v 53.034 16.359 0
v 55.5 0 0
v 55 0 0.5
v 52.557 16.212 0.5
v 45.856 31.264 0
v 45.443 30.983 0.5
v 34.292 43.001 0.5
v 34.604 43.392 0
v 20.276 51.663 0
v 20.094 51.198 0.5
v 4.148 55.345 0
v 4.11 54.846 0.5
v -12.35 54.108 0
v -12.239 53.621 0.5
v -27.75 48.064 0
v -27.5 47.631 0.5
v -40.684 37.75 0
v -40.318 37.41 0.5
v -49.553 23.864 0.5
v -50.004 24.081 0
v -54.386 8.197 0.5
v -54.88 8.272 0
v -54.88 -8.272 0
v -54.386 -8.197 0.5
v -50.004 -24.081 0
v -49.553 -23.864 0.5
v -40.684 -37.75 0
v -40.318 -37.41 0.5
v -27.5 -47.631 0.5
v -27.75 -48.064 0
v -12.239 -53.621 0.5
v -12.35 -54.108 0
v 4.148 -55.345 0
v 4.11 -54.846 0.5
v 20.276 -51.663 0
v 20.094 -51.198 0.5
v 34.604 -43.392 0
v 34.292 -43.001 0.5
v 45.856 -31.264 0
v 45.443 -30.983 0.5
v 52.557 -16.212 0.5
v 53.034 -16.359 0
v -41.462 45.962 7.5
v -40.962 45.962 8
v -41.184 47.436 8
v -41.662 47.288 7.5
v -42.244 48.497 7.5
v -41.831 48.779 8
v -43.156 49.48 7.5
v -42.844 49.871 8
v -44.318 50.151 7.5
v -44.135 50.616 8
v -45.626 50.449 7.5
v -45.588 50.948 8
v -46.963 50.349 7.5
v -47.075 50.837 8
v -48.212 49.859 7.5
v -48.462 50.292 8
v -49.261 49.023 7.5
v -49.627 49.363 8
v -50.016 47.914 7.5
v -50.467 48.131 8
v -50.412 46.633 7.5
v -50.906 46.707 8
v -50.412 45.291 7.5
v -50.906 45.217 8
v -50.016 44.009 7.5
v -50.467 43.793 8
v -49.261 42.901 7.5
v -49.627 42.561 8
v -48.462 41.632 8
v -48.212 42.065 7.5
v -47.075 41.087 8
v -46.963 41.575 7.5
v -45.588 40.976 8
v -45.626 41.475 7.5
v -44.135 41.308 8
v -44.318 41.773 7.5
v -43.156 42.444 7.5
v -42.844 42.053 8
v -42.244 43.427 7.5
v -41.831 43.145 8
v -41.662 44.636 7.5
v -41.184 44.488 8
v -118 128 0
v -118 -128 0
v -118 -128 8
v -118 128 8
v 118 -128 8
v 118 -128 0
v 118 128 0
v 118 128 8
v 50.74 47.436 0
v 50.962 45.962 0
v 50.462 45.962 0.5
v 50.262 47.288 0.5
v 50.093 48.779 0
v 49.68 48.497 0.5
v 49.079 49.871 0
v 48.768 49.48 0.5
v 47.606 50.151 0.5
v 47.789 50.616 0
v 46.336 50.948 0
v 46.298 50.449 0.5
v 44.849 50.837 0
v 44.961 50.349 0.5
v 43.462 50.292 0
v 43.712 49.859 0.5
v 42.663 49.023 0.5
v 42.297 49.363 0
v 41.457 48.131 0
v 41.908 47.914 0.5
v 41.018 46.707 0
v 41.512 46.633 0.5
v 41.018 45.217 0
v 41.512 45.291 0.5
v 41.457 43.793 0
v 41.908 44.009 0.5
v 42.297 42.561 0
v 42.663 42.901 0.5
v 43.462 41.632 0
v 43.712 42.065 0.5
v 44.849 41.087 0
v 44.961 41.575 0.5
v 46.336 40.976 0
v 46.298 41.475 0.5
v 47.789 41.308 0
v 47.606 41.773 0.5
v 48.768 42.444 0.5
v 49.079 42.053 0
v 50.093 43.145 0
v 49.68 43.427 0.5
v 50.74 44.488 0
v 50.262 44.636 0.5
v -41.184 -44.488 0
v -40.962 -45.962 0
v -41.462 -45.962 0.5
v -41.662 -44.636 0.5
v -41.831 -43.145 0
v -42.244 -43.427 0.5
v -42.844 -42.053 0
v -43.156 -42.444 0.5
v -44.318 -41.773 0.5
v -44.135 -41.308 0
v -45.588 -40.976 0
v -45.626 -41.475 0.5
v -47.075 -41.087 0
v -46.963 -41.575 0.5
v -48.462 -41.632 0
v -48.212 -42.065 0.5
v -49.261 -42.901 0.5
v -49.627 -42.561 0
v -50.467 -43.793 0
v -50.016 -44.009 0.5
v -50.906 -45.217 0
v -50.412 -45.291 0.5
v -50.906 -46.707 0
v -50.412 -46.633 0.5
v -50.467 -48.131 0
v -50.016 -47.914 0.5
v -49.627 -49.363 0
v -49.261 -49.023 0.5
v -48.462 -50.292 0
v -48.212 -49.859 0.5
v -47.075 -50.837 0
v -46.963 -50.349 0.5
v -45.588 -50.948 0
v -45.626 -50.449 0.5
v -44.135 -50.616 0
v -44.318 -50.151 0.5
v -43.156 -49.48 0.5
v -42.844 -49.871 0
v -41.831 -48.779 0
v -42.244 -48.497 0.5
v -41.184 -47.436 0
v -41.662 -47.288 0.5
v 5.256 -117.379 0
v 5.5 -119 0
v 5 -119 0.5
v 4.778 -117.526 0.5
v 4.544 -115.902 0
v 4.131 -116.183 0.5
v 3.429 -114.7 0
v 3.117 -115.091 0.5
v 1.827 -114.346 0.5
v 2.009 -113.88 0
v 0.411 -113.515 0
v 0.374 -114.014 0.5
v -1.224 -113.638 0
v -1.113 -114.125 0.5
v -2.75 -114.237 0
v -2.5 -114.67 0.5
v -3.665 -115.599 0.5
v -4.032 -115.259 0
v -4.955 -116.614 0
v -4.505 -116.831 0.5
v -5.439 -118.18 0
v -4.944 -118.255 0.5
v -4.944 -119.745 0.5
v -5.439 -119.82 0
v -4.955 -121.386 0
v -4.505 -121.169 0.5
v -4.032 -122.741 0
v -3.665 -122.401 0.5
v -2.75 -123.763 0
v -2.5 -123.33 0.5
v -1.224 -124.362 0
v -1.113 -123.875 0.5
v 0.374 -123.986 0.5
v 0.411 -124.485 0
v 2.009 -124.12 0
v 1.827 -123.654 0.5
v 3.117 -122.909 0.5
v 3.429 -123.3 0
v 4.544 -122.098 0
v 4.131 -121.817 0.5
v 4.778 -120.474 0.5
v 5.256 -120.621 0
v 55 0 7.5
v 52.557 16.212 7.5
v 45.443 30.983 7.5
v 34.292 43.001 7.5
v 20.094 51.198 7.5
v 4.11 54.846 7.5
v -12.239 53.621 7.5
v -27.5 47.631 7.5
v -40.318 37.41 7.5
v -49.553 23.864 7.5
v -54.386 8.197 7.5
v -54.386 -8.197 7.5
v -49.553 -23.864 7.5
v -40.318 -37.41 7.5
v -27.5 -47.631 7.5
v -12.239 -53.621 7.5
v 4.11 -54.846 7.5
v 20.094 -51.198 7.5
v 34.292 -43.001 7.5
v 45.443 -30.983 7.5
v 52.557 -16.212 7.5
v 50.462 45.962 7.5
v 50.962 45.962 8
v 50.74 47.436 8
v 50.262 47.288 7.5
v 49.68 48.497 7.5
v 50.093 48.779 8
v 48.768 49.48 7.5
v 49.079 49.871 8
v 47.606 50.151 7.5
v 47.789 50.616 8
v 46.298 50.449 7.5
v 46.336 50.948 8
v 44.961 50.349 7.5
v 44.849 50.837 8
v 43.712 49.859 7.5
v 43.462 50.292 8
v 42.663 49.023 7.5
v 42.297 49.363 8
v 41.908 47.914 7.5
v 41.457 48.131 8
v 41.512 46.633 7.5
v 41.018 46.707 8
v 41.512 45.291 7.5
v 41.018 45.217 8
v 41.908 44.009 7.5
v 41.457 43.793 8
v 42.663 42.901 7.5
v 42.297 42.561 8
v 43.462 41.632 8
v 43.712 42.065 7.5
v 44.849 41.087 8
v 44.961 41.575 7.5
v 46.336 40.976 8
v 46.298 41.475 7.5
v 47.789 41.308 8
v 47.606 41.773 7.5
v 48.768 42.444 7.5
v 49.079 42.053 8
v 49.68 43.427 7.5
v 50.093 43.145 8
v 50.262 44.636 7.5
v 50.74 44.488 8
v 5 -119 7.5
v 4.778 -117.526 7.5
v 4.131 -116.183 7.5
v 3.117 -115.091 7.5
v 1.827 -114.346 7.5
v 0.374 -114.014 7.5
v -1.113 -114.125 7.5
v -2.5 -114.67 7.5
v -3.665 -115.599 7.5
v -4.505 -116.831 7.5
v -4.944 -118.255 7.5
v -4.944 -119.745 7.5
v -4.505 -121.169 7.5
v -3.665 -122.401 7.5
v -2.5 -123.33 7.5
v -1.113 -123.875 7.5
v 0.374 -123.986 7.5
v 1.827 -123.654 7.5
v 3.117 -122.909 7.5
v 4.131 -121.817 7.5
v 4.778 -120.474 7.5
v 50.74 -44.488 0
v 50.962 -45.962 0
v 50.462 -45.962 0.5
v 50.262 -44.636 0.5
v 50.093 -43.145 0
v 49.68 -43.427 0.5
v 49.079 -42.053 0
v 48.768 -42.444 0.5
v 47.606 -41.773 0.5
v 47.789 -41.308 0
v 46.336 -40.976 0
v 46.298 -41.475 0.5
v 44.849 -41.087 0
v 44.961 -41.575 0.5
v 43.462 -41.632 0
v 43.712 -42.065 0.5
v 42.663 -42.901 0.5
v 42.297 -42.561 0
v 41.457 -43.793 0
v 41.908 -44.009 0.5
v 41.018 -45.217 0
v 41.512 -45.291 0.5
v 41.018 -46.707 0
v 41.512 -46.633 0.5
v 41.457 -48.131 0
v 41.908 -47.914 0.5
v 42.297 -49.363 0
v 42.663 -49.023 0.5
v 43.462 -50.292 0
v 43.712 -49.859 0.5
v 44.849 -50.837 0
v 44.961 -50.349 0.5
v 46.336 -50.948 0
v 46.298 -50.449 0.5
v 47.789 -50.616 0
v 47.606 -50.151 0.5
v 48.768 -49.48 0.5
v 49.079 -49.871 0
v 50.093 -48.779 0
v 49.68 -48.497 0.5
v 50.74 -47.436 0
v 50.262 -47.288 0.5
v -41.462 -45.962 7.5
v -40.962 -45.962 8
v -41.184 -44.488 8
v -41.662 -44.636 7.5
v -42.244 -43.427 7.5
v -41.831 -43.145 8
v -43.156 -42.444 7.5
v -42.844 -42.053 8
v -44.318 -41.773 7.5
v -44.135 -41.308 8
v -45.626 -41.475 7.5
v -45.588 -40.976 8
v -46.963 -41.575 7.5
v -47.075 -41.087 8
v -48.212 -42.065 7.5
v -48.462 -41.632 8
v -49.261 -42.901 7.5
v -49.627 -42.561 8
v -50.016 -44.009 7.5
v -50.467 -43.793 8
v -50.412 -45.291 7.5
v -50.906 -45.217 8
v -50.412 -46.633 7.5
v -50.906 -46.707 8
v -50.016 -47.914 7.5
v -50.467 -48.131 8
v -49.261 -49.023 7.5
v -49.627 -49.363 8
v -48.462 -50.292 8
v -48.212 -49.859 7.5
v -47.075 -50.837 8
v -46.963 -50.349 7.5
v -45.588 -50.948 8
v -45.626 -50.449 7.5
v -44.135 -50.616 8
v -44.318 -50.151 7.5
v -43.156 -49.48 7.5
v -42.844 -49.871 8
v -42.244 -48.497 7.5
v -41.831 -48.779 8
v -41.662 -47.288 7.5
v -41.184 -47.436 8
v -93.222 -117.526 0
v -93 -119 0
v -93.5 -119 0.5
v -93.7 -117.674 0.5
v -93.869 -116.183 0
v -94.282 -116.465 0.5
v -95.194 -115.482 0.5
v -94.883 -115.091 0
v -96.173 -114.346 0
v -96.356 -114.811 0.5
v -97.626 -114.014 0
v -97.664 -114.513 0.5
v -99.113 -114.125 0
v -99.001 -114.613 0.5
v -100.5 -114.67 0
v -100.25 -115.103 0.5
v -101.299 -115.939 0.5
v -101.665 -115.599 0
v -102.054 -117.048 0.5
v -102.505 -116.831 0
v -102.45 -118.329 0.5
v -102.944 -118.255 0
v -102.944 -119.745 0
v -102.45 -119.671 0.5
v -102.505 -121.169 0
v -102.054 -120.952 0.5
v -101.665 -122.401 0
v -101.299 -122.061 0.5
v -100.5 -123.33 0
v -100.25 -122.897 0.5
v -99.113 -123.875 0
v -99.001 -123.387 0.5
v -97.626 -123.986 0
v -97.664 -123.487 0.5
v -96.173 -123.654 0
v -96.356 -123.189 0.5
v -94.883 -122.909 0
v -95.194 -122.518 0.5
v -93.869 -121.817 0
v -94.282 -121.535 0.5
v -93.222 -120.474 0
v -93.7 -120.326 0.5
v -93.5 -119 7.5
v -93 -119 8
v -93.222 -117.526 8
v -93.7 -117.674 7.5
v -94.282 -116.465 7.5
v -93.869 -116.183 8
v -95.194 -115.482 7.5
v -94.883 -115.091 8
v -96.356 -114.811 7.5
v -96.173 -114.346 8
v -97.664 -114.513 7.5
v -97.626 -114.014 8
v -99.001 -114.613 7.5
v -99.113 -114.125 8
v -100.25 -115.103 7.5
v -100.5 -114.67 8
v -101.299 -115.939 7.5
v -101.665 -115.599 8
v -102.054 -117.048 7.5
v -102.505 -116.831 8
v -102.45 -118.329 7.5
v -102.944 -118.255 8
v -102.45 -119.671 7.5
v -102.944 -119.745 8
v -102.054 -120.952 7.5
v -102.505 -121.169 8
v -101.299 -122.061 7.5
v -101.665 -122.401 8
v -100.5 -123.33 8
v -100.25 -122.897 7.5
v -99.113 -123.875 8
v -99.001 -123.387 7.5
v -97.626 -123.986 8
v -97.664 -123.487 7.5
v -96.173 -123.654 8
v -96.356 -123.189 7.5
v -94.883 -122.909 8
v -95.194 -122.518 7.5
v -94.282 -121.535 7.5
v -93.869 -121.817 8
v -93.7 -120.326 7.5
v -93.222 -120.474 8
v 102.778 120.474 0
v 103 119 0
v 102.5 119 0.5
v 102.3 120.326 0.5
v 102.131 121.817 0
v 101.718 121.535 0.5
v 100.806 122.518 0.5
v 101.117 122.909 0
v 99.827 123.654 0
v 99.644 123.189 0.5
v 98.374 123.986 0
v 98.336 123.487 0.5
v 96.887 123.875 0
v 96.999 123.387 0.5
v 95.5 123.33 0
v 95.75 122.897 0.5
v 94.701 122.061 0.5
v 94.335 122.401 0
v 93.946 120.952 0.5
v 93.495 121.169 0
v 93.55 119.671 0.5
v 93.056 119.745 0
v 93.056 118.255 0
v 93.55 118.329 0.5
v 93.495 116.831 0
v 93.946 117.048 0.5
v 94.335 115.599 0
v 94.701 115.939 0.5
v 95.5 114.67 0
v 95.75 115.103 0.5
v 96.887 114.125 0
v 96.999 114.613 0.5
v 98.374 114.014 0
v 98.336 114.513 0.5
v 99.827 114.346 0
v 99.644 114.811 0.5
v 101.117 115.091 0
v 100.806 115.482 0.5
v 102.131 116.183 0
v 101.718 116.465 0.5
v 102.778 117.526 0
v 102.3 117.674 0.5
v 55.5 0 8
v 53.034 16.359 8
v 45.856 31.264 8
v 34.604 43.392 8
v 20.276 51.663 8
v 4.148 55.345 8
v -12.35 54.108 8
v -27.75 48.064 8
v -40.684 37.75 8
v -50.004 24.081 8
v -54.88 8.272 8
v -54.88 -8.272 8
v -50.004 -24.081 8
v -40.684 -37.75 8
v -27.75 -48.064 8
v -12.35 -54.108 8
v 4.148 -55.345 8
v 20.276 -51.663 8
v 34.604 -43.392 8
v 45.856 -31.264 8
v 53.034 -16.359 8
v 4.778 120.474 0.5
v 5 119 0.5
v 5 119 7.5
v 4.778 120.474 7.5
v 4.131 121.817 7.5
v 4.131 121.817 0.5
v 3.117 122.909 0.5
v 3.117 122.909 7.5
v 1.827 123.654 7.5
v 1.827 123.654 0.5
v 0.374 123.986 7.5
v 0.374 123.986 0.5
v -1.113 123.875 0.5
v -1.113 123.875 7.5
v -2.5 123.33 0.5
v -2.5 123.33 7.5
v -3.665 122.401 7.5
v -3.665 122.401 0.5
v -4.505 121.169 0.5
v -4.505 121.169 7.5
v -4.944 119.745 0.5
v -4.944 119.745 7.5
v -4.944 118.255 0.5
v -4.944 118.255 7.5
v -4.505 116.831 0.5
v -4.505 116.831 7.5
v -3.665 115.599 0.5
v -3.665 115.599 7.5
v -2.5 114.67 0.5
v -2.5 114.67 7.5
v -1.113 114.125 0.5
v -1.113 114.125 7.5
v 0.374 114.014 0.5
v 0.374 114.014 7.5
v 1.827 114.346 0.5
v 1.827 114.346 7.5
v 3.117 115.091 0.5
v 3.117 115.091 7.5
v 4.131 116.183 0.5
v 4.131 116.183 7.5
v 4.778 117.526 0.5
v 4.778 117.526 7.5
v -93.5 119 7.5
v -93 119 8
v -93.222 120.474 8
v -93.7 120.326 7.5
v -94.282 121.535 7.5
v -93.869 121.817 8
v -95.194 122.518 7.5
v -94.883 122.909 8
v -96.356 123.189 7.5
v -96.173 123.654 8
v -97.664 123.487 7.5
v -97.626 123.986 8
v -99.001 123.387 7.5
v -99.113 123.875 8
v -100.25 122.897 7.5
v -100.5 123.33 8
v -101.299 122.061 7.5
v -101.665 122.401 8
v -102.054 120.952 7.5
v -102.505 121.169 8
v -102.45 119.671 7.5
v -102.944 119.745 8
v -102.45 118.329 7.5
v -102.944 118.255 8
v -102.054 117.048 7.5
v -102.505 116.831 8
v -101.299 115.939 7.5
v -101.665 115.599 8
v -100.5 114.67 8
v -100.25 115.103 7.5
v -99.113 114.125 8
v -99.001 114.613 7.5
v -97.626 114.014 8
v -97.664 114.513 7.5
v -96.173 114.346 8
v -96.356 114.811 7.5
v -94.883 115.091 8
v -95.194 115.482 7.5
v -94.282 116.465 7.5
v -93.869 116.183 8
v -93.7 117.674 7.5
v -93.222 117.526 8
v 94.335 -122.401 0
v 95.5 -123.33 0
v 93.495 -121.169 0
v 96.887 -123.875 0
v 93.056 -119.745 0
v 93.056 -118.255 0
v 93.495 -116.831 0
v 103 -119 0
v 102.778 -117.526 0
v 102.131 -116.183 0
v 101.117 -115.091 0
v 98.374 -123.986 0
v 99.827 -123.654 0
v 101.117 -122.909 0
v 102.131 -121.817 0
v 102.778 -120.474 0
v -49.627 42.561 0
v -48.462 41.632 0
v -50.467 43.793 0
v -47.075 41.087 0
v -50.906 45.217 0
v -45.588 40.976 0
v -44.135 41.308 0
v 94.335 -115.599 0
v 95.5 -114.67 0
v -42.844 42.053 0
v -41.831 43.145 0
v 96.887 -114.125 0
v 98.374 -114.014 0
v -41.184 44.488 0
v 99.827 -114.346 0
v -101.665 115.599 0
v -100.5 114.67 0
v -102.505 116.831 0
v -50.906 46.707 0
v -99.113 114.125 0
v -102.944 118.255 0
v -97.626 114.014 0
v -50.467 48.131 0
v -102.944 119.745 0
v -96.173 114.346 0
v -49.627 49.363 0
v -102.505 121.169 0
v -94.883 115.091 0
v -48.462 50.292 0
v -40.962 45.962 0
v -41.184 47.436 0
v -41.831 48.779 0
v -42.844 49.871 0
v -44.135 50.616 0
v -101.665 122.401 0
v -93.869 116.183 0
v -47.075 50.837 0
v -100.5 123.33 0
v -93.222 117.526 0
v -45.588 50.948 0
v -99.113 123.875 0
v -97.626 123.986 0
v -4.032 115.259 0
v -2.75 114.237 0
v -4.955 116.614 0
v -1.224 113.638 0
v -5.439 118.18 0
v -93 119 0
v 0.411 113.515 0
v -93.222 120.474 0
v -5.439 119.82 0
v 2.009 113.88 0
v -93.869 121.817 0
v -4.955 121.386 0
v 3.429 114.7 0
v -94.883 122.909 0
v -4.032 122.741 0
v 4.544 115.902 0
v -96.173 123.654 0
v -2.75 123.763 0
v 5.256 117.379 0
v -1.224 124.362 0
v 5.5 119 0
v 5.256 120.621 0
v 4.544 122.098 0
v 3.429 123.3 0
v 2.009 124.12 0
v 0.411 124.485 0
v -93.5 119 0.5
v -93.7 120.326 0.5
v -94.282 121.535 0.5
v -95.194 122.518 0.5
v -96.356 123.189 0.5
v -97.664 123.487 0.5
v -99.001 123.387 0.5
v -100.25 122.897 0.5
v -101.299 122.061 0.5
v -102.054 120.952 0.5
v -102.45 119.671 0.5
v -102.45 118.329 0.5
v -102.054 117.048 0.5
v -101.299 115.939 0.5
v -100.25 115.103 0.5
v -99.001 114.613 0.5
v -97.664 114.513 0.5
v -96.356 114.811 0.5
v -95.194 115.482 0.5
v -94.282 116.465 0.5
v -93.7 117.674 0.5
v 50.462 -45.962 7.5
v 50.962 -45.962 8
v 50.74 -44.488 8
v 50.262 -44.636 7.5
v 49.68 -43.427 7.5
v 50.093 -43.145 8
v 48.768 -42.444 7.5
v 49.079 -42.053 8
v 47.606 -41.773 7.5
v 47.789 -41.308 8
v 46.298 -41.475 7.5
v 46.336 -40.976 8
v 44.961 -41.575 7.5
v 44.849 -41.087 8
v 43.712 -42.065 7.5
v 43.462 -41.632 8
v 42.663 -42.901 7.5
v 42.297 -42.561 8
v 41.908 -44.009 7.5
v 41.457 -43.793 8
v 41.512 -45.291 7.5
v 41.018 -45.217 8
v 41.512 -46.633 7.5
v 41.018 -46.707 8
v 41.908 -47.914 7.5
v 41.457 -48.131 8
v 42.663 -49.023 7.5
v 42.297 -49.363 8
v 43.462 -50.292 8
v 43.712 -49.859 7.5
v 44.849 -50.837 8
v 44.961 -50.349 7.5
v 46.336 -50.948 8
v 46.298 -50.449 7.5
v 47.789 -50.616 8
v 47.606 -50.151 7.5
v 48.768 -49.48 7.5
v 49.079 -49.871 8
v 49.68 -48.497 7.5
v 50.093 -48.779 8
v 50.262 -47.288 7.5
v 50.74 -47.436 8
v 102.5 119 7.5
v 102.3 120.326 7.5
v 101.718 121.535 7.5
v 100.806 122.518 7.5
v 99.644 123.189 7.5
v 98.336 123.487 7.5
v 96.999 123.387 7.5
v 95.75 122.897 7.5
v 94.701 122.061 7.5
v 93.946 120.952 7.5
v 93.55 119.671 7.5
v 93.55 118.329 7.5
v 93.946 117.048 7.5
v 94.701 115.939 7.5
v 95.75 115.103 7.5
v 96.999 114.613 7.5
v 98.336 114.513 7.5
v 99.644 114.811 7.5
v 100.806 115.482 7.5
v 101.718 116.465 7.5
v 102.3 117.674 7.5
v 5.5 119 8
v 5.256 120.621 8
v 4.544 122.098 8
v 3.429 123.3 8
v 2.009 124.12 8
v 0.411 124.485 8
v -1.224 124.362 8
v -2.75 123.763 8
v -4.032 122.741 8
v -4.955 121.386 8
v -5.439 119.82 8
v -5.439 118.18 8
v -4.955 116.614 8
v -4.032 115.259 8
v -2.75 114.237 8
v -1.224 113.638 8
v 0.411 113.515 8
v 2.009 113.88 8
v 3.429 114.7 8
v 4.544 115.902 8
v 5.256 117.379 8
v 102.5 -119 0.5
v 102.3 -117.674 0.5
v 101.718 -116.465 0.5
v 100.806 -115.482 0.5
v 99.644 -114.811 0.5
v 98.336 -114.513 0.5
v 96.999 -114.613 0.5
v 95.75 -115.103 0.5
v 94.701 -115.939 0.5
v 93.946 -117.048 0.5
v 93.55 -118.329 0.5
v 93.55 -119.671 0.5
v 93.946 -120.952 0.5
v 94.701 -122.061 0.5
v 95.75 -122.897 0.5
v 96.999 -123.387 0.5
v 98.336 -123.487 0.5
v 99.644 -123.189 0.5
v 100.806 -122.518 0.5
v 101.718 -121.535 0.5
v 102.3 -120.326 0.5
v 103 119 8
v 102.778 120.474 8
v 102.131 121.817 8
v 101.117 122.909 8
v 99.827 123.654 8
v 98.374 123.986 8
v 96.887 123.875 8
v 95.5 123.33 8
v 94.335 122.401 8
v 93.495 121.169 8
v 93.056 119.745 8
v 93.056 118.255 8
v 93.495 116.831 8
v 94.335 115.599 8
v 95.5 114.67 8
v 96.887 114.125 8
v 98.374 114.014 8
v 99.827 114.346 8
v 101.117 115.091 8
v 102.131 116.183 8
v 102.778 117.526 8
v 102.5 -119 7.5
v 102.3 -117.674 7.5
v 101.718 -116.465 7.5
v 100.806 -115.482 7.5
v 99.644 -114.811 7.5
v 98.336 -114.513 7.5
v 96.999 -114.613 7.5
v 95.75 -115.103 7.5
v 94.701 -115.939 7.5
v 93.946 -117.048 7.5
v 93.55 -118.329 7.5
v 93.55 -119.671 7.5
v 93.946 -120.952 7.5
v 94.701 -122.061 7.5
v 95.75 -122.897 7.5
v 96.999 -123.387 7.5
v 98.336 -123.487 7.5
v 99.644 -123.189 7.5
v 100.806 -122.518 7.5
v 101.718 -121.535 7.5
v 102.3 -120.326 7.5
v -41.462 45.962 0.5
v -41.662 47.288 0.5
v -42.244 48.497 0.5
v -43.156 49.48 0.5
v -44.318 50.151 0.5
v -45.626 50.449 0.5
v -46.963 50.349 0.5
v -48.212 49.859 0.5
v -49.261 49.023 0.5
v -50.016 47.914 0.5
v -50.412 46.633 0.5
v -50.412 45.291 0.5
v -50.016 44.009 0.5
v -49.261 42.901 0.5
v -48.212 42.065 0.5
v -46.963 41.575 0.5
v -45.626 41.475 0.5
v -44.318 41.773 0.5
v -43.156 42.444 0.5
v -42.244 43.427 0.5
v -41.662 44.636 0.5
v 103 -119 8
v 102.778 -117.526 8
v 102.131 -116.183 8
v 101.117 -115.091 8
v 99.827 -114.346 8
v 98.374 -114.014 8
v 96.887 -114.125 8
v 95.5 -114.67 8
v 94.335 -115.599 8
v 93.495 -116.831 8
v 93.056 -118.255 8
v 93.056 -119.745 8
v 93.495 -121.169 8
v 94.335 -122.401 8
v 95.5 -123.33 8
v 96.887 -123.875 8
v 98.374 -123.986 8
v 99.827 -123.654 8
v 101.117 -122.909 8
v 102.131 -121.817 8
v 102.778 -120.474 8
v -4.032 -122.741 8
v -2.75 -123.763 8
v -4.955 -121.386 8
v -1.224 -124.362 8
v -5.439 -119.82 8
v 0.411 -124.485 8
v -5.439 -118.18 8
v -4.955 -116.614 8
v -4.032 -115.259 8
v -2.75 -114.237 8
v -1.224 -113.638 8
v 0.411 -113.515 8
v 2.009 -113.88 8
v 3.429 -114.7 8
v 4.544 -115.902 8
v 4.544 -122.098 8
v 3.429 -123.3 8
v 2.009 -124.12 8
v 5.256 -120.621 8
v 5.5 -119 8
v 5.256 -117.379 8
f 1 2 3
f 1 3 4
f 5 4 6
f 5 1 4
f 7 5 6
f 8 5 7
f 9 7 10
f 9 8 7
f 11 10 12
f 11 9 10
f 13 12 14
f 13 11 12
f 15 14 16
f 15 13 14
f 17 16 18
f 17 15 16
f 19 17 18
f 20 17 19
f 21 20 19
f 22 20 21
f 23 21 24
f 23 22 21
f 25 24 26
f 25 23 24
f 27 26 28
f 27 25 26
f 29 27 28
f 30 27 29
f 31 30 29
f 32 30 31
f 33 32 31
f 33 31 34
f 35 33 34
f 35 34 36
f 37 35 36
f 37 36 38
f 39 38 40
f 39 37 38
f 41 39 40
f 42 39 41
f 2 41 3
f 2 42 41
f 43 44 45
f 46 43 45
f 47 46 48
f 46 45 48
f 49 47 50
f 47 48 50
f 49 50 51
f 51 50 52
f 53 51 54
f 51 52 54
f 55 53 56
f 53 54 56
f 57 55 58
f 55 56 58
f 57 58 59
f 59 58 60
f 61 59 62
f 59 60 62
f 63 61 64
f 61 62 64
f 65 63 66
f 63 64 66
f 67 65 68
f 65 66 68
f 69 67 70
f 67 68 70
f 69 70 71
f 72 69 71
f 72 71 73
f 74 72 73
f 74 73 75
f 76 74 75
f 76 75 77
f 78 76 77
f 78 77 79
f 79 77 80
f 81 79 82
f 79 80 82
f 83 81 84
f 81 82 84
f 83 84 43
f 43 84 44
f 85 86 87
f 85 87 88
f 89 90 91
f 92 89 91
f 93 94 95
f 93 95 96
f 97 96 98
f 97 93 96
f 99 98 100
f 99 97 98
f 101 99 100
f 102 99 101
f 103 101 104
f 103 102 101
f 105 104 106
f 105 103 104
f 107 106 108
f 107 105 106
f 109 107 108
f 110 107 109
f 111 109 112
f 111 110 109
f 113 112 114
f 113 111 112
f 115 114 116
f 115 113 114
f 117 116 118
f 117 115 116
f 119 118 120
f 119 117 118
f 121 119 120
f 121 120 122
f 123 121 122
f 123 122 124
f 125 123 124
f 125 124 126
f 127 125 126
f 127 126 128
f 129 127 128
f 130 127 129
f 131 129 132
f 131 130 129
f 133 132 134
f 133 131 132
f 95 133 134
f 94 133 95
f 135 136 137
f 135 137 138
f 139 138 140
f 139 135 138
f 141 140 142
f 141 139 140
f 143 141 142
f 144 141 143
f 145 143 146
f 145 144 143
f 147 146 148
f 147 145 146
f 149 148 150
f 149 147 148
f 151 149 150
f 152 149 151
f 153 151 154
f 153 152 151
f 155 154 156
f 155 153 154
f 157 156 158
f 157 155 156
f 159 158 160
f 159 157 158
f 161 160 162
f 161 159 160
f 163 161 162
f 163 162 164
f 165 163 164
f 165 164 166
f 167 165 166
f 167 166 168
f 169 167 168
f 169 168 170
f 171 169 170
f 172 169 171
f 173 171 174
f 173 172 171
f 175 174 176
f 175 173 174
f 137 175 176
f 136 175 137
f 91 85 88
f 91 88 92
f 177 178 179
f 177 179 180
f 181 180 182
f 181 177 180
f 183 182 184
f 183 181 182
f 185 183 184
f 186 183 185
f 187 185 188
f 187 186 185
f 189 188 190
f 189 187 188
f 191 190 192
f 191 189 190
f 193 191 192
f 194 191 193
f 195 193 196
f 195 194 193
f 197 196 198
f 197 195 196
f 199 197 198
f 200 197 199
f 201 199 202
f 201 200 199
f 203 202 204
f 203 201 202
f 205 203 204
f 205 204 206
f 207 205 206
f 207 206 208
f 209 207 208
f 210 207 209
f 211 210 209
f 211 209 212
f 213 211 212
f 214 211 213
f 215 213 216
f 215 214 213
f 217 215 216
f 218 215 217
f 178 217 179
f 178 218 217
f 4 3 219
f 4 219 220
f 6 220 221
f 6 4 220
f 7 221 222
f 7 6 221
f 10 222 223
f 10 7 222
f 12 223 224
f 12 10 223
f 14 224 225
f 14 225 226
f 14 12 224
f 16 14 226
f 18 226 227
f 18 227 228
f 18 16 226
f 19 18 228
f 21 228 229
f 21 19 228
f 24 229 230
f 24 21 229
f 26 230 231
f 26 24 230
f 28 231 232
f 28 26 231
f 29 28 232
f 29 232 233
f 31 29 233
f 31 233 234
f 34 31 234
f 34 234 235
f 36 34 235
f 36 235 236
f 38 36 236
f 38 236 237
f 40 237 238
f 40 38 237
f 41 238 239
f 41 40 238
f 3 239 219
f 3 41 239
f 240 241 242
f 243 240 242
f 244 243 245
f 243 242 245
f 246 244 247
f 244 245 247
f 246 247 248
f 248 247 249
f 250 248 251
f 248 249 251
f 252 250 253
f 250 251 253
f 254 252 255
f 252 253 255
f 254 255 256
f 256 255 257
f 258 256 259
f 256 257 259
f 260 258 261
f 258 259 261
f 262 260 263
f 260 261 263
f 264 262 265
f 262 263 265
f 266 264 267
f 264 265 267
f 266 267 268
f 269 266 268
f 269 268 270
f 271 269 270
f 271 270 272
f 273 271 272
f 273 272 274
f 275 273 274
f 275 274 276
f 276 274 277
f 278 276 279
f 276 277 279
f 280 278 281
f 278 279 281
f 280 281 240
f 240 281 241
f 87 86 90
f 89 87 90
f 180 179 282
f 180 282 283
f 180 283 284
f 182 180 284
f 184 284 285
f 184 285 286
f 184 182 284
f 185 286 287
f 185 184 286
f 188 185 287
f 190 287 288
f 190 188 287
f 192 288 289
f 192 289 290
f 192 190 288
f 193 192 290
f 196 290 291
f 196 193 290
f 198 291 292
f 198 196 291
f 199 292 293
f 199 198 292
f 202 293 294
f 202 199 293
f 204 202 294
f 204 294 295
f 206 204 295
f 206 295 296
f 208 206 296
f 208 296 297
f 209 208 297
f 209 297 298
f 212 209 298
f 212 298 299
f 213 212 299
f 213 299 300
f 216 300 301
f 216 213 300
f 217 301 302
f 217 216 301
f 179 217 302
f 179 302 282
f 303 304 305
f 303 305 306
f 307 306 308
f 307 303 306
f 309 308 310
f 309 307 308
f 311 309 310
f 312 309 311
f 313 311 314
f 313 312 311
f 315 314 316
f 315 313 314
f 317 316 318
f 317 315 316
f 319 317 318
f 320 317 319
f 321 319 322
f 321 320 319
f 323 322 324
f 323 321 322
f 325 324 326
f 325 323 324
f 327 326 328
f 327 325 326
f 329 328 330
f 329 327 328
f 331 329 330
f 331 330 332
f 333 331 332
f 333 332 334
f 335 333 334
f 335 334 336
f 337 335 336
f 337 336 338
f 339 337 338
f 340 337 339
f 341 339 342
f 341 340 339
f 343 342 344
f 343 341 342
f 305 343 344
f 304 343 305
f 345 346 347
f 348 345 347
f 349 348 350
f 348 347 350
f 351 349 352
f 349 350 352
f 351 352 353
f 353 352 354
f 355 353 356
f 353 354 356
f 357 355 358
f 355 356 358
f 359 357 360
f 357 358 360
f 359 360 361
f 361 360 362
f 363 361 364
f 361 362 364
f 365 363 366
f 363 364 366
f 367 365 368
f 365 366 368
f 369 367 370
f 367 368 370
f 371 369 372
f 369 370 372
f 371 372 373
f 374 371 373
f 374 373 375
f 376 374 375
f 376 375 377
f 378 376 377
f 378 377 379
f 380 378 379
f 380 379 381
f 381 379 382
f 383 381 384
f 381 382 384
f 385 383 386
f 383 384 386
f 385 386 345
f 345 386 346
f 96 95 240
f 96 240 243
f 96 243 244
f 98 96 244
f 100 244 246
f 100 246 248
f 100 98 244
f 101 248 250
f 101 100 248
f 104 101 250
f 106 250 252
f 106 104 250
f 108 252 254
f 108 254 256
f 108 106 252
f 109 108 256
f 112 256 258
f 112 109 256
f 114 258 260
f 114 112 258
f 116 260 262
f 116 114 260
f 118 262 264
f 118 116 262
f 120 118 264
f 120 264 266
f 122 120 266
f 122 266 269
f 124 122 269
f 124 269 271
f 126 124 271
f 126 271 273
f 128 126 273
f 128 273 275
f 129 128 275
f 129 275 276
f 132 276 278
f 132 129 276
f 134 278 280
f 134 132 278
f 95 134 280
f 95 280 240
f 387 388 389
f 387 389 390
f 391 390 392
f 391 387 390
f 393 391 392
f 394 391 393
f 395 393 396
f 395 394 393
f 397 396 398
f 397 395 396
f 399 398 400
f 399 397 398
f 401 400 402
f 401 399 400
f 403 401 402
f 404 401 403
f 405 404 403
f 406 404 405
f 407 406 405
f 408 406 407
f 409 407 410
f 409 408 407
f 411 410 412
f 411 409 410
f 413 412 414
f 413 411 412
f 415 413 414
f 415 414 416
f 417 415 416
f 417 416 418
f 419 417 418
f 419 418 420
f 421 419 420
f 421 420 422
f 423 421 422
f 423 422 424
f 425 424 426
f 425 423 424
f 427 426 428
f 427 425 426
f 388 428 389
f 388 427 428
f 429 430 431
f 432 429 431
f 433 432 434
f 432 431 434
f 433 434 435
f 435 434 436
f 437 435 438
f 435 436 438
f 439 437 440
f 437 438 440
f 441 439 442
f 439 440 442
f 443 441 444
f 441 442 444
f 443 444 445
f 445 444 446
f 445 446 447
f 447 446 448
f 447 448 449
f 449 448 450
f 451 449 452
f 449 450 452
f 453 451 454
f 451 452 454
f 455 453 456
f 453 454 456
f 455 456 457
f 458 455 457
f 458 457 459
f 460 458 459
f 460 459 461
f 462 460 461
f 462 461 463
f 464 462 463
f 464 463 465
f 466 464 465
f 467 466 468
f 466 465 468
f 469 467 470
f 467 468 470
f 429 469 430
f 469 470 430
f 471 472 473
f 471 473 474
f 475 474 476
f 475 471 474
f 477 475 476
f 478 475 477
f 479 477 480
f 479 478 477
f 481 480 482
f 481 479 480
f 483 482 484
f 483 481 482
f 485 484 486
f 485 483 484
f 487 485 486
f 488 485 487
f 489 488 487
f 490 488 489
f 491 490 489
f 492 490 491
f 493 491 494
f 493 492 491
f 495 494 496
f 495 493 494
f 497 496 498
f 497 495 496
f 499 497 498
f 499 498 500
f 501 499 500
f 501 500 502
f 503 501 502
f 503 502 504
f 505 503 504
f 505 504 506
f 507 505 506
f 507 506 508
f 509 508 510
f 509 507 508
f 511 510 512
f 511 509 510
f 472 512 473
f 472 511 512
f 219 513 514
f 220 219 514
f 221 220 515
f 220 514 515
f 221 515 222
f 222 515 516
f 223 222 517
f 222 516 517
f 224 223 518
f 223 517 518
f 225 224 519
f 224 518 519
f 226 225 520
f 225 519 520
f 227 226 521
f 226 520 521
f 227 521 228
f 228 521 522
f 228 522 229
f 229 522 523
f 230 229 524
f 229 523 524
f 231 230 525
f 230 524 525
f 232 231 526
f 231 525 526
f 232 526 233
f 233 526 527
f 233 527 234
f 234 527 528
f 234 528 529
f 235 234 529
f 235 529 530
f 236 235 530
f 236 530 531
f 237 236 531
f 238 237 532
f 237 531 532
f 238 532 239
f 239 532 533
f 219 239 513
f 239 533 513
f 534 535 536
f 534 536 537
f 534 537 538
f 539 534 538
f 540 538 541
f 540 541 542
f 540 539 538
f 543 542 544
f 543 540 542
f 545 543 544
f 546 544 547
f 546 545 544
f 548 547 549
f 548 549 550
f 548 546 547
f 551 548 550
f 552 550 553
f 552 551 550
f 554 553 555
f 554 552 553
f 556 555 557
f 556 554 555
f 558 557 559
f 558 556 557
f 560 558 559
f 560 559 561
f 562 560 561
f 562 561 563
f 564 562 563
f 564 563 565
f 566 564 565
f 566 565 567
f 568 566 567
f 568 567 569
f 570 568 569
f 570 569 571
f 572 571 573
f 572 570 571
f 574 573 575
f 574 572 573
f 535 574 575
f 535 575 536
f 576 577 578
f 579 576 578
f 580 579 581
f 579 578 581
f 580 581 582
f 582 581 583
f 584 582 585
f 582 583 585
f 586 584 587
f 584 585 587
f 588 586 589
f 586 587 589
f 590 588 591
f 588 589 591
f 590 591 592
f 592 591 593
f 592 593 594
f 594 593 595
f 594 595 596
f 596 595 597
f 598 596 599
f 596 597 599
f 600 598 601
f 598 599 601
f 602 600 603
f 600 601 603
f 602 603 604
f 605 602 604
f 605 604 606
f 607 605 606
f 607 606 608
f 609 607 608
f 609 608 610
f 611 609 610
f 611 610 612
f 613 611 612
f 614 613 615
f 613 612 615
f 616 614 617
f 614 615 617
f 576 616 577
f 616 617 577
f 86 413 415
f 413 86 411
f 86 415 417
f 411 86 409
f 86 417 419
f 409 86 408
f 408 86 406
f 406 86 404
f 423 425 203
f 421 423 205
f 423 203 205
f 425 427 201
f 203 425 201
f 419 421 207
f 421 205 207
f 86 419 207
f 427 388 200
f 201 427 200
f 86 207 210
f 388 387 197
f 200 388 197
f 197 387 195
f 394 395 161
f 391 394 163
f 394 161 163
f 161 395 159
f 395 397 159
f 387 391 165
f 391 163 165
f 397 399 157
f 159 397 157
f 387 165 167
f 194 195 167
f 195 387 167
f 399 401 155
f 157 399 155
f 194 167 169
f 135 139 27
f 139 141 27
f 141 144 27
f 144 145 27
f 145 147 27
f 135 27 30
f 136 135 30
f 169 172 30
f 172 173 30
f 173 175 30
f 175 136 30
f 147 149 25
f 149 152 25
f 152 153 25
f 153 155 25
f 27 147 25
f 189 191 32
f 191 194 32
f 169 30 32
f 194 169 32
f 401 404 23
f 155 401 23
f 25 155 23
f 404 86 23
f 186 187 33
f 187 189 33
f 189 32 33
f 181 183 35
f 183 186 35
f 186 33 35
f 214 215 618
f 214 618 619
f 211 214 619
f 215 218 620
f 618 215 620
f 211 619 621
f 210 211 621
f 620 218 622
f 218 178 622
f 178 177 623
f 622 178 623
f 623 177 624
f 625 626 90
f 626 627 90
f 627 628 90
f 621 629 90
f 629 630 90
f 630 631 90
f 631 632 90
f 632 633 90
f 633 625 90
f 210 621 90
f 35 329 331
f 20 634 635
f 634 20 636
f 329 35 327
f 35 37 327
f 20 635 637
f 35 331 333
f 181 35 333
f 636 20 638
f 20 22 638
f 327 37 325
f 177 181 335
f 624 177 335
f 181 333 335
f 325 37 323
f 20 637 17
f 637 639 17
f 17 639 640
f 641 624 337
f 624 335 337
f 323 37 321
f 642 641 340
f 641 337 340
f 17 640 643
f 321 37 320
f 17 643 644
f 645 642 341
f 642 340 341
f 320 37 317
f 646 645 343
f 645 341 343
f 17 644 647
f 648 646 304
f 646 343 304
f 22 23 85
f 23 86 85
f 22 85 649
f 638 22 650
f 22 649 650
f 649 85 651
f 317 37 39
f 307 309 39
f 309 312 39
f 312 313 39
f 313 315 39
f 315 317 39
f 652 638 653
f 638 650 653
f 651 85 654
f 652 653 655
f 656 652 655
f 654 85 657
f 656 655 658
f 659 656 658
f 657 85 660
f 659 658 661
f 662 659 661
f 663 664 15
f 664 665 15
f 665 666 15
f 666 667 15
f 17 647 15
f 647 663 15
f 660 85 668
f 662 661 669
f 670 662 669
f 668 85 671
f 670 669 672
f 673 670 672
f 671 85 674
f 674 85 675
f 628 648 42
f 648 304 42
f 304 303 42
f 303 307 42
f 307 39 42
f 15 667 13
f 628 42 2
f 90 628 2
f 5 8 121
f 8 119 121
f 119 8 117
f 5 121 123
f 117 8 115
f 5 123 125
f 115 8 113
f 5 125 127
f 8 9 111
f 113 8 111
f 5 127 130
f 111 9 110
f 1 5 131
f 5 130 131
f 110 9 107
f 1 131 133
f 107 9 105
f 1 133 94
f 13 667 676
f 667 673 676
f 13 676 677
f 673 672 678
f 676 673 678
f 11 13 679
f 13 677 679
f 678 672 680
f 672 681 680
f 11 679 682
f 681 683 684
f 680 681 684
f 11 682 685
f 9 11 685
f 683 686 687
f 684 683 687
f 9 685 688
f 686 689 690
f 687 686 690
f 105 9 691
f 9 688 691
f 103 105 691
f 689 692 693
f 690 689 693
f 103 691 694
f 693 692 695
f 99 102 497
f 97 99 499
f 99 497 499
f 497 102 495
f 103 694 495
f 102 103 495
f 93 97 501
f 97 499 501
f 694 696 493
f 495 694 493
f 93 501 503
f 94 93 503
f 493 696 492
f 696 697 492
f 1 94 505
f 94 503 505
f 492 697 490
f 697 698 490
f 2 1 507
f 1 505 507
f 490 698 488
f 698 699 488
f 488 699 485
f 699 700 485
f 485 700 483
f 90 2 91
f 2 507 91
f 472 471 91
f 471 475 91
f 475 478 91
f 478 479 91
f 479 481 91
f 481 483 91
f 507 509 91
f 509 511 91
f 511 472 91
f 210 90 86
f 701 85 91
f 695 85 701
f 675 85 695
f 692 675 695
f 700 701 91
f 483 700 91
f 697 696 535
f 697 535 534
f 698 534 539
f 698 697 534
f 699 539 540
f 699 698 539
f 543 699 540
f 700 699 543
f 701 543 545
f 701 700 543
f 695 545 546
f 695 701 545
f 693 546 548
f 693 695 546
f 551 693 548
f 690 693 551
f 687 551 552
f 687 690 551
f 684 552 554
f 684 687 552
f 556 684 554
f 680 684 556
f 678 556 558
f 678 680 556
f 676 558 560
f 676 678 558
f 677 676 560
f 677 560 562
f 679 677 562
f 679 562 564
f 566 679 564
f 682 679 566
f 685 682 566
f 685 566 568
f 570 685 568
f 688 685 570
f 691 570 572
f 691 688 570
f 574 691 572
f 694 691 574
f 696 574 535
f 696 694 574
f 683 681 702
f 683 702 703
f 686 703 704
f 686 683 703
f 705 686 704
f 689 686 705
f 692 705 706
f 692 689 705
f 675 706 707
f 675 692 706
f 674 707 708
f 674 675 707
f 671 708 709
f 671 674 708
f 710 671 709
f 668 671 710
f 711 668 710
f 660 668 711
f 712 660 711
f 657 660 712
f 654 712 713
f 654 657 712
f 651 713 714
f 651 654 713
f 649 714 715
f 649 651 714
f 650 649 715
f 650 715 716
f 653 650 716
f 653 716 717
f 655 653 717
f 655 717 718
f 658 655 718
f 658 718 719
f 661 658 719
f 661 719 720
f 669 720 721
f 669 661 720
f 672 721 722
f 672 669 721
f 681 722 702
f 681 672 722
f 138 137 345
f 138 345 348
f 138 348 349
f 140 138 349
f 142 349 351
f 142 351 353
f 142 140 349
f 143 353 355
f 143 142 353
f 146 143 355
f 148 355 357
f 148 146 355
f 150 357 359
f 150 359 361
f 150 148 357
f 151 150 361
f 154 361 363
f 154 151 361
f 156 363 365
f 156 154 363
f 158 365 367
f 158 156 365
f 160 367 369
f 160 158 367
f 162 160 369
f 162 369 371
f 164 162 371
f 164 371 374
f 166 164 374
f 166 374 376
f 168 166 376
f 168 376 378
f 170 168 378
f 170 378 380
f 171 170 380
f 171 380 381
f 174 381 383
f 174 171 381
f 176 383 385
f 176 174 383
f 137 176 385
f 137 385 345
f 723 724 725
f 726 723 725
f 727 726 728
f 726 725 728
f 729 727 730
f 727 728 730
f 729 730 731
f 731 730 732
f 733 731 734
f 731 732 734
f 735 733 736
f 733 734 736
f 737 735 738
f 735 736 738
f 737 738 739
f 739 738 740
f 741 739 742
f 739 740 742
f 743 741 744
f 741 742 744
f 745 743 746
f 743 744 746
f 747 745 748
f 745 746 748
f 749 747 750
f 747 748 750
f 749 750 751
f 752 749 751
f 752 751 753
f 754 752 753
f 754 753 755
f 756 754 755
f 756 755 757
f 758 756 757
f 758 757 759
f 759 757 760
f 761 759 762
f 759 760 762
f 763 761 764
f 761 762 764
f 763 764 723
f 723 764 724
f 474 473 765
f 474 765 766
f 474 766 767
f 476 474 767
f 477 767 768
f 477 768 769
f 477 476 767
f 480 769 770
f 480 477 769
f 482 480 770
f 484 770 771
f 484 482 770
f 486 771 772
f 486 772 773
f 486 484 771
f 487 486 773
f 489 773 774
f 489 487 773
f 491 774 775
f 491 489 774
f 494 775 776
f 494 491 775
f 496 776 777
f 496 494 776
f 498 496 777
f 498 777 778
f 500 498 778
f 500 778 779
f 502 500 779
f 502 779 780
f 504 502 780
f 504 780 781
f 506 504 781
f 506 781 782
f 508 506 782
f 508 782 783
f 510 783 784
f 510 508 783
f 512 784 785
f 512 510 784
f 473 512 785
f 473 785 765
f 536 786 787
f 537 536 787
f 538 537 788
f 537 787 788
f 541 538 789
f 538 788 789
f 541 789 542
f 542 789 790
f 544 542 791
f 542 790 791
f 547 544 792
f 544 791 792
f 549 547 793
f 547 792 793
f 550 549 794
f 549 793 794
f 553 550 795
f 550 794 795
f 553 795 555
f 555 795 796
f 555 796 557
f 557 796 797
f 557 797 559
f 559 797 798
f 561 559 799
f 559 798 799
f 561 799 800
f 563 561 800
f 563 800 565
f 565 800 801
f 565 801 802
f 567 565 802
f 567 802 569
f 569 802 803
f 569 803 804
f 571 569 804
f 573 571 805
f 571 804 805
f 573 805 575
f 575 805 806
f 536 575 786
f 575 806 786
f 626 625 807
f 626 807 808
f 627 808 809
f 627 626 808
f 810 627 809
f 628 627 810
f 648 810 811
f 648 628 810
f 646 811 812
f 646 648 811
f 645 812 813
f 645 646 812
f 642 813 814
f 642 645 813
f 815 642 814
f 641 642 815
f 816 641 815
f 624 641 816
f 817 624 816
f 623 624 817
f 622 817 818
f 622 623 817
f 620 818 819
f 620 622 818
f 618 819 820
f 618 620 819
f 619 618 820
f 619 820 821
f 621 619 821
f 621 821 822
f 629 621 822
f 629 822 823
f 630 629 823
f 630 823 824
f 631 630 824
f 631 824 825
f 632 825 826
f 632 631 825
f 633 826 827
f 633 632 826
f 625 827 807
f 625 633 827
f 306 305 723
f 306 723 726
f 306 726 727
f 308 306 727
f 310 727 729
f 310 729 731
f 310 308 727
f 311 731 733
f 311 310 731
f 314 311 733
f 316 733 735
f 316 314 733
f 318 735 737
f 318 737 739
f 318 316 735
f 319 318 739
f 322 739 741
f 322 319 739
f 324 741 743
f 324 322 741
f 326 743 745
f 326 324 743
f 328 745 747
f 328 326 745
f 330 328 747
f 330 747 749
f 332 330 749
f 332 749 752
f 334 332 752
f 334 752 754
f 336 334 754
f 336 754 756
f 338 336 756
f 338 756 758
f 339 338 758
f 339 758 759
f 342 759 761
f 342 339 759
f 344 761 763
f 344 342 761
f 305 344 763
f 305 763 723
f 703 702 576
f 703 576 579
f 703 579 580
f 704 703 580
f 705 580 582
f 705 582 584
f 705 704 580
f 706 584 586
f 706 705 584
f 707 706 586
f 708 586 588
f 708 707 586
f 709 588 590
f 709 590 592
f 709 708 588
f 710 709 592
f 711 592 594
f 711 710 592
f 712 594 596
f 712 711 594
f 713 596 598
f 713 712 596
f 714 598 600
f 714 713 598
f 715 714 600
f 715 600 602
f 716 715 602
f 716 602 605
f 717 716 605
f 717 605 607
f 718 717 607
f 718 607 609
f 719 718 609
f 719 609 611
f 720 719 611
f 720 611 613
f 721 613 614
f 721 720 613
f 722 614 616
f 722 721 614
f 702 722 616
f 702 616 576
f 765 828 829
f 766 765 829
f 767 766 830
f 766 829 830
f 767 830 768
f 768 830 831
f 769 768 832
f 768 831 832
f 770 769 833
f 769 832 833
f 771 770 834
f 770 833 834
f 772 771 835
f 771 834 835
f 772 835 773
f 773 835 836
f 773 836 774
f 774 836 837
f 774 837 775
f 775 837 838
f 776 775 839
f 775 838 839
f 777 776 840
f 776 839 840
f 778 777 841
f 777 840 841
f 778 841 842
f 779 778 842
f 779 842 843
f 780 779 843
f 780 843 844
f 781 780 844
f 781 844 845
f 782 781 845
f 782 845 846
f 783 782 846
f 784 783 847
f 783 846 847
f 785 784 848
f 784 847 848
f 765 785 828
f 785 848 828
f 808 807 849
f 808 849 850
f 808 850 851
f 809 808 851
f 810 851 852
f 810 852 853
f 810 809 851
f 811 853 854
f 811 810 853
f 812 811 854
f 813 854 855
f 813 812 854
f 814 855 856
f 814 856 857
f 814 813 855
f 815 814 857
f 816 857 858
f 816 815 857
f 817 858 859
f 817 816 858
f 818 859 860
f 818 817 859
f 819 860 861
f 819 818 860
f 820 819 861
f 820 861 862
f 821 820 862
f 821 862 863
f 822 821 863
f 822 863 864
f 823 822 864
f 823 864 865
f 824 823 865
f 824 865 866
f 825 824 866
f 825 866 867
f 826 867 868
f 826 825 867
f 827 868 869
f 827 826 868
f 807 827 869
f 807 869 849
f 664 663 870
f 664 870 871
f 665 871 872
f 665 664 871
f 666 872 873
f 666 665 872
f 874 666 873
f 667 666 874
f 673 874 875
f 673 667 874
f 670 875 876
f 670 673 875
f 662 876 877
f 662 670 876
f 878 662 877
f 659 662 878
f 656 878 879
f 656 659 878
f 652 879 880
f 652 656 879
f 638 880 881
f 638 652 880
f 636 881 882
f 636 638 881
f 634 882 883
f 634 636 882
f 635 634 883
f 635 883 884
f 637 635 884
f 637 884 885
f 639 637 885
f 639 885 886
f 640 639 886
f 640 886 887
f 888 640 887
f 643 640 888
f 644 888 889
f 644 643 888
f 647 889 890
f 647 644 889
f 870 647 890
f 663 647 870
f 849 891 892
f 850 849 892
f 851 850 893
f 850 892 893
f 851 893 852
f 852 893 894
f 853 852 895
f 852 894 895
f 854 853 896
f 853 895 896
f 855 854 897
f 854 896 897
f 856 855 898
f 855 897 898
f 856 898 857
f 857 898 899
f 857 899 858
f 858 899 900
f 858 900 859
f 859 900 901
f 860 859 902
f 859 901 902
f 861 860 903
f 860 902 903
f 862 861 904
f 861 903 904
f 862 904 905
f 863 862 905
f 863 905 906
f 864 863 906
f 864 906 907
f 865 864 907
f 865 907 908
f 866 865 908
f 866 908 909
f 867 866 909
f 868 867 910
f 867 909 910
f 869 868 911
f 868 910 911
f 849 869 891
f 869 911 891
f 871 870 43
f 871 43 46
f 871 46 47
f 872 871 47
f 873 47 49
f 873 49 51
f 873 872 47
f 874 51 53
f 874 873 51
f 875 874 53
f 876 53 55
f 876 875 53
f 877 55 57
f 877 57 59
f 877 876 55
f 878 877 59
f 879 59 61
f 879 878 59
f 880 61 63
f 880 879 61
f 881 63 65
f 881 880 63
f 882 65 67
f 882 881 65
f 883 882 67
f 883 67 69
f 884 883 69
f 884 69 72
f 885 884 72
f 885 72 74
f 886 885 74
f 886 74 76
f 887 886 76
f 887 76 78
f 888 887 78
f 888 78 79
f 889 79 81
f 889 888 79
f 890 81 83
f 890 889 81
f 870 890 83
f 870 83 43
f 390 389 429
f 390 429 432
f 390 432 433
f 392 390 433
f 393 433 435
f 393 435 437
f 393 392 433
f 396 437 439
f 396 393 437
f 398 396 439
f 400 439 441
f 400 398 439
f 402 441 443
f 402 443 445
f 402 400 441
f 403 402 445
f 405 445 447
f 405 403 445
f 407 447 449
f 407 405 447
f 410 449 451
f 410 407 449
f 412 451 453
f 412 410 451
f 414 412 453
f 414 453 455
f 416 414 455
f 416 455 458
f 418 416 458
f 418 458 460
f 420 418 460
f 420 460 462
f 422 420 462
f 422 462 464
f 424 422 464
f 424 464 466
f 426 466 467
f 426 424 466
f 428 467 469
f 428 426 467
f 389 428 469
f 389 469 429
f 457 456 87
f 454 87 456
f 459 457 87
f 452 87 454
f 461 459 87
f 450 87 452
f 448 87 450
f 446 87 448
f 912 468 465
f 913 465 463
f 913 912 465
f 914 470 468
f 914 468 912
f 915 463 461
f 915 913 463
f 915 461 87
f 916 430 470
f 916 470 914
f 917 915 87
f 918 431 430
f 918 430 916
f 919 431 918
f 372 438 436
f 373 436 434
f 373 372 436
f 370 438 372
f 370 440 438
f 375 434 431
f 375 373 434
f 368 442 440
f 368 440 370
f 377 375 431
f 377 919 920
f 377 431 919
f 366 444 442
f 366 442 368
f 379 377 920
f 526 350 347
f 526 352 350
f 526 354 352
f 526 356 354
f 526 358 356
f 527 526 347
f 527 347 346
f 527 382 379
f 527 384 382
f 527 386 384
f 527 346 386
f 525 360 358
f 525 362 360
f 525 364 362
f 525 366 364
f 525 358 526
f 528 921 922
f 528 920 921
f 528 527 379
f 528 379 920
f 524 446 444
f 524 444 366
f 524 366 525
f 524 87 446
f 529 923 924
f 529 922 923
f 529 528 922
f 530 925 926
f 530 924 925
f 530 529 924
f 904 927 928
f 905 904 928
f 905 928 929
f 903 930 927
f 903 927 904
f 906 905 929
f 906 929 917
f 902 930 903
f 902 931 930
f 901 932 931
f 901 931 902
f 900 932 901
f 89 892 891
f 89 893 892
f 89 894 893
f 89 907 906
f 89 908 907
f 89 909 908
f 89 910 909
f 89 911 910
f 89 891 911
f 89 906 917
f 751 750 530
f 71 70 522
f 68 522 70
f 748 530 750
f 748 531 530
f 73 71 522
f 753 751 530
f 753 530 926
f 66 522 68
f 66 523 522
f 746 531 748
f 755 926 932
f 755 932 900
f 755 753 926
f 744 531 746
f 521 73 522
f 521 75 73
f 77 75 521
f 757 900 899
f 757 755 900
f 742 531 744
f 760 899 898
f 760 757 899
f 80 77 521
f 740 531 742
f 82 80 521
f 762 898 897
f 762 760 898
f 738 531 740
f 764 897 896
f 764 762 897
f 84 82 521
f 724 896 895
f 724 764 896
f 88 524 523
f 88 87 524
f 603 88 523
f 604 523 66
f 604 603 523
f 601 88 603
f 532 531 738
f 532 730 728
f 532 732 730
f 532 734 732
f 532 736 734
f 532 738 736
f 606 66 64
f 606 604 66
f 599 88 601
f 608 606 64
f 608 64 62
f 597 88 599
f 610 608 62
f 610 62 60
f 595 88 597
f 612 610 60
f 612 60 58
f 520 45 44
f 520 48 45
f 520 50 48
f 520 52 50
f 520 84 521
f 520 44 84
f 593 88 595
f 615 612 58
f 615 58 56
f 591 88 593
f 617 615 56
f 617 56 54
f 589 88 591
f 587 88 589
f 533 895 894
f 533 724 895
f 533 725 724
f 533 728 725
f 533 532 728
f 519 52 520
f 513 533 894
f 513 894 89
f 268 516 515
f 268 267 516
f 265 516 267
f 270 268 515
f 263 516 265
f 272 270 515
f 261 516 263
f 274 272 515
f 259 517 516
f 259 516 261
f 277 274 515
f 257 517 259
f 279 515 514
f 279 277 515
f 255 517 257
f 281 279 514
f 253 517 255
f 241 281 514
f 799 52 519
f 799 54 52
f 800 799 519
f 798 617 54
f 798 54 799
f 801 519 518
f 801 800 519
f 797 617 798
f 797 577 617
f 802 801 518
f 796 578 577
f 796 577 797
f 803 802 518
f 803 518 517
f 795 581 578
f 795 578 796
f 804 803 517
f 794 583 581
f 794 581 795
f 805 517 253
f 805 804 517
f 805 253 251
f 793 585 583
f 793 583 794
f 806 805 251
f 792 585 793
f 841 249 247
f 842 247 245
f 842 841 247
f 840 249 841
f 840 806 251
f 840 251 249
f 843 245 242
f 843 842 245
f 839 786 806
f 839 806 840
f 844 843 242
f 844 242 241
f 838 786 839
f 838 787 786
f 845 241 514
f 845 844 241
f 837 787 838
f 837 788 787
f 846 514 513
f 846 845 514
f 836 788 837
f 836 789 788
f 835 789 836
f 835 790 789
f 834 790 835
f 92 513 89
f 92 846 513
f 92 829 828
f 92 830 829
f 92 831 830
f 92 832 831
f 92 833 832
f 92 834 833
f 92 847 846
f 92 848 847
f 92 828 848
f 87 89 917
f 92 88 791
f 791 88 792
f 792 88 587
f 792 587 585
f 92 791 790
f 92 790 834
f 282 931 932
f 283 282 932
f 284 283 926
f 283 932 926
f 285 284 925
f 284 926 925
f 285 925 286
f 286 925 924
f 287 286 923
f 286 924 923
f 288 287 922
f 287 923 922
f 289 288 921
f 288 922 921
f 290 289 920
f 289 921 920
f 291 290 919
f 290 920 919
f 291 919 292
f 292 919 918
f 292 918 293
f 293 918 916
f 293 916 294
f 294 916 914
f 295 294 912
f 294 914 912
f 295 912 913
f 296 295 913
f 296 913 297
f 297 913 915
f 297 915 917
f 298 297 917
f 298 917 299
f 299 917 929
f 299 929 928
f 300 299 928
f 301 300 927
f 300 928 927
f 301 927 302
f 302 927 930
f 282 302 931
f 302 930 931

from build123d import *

# Parameters (mm, degrees)
F0_W     = 236
F0_H     = 256
F0_R     = 4.5
F0_R_2   = 5
F0_R_3   = 55
F1_DEPTH = 8
F2_SIZE  = 0.5


with BuildPart() as f1:
    # F0 (on Top) → F1 (new body)
    with BuildSketch(Plane.XY):
        Rectangle(F0_W, F0_H)
        with Locations((-98, -119)):
            Circle(F0_R, mode=Mode.SUBTRACT)
        with Locations((-45.961941, -45.961941)):
            Circle(F0_R, mode=Mode.SUBTRACT)
        with Locations((0, -119)):
            Circle(F0_R_2, mode=Mode.SUBTRACT)
        with Locations((98, -119)):
            Circle(F0_R, mode=Mode.SUBTRACT)
        with Locations((45.961941, -45.961941)):
            Circle(F0_R, mode=Mode.SUBTRACT)
        with Locations((-45.961941, 45.961941)):
            Circle(F0_R, mode=Mode.SUBTRACT)
        with Locations((-98, 119)):
            Circle(F0_R, mode=Mode.SUBTRACT)
        Circle(F0_R_3, mode=Mode.SUBTRACT)
        with Locations((45.961941, 45.961941)):
            Circle(F0_R, mode=Mode.SUBTRACT)
        with Locations((0, 119)):
            Circle(F0_R_2, mode=Mode.SUBTRACT)
        with Locations((98, 119)):
            Circle(F0_R, mode=Mode.SUBTRACT)
    extrude(amount=F1_DEPTH)

    # F2
    f2_edges = [f1.edges().sort_by_distance(p)[0] for p in [
        (-93.5, -119, 4),
        (-102.5, -119, 0),
        (-102.5, -119, 8),
        (-41.461941, -45.961941, 4),
        (-50.461941, -45.961941, 0),
        (-50.461941, -45.961941, 8),
        (55, 0, 4),
        (-55, 0, 0),
        (-55, 0, 8),
        (-41.461941, 45.961941, 4),
        (-50.461941, 45.961941, 0),
        (-50.461941, 45.961941, 8),
        (50.461941, -45.961941, 4),
        (41.461941, -45.961941, 0),
        (41.461941, -45.961941, 8),
        (102.5, -119, 4),
        (93.5, -119, 0),
        (93.5, -119, 8),
        (-93.5, 119, 4),
        (-102.5, 119, 0),
        (-102.5, 119, 8),
        (50.461941, 45.961941, 4),
        (41.461941, 45.961941, 0),
        (41.461941, 45.961941, 8),
        (102.5, 119, 4),
        (93.5, 119, 0),
        (93.5, 119, 8),
        (5, 119, 4),
        (-5, 119, 0),
        (-5, 119, 8),
        (5, -119, 4),
        (-5, -119, 0),
        (-5, -119, 8),
    ]]
    chamfer(f2_edges, length=F2_SIZE)


solid = f1.part
